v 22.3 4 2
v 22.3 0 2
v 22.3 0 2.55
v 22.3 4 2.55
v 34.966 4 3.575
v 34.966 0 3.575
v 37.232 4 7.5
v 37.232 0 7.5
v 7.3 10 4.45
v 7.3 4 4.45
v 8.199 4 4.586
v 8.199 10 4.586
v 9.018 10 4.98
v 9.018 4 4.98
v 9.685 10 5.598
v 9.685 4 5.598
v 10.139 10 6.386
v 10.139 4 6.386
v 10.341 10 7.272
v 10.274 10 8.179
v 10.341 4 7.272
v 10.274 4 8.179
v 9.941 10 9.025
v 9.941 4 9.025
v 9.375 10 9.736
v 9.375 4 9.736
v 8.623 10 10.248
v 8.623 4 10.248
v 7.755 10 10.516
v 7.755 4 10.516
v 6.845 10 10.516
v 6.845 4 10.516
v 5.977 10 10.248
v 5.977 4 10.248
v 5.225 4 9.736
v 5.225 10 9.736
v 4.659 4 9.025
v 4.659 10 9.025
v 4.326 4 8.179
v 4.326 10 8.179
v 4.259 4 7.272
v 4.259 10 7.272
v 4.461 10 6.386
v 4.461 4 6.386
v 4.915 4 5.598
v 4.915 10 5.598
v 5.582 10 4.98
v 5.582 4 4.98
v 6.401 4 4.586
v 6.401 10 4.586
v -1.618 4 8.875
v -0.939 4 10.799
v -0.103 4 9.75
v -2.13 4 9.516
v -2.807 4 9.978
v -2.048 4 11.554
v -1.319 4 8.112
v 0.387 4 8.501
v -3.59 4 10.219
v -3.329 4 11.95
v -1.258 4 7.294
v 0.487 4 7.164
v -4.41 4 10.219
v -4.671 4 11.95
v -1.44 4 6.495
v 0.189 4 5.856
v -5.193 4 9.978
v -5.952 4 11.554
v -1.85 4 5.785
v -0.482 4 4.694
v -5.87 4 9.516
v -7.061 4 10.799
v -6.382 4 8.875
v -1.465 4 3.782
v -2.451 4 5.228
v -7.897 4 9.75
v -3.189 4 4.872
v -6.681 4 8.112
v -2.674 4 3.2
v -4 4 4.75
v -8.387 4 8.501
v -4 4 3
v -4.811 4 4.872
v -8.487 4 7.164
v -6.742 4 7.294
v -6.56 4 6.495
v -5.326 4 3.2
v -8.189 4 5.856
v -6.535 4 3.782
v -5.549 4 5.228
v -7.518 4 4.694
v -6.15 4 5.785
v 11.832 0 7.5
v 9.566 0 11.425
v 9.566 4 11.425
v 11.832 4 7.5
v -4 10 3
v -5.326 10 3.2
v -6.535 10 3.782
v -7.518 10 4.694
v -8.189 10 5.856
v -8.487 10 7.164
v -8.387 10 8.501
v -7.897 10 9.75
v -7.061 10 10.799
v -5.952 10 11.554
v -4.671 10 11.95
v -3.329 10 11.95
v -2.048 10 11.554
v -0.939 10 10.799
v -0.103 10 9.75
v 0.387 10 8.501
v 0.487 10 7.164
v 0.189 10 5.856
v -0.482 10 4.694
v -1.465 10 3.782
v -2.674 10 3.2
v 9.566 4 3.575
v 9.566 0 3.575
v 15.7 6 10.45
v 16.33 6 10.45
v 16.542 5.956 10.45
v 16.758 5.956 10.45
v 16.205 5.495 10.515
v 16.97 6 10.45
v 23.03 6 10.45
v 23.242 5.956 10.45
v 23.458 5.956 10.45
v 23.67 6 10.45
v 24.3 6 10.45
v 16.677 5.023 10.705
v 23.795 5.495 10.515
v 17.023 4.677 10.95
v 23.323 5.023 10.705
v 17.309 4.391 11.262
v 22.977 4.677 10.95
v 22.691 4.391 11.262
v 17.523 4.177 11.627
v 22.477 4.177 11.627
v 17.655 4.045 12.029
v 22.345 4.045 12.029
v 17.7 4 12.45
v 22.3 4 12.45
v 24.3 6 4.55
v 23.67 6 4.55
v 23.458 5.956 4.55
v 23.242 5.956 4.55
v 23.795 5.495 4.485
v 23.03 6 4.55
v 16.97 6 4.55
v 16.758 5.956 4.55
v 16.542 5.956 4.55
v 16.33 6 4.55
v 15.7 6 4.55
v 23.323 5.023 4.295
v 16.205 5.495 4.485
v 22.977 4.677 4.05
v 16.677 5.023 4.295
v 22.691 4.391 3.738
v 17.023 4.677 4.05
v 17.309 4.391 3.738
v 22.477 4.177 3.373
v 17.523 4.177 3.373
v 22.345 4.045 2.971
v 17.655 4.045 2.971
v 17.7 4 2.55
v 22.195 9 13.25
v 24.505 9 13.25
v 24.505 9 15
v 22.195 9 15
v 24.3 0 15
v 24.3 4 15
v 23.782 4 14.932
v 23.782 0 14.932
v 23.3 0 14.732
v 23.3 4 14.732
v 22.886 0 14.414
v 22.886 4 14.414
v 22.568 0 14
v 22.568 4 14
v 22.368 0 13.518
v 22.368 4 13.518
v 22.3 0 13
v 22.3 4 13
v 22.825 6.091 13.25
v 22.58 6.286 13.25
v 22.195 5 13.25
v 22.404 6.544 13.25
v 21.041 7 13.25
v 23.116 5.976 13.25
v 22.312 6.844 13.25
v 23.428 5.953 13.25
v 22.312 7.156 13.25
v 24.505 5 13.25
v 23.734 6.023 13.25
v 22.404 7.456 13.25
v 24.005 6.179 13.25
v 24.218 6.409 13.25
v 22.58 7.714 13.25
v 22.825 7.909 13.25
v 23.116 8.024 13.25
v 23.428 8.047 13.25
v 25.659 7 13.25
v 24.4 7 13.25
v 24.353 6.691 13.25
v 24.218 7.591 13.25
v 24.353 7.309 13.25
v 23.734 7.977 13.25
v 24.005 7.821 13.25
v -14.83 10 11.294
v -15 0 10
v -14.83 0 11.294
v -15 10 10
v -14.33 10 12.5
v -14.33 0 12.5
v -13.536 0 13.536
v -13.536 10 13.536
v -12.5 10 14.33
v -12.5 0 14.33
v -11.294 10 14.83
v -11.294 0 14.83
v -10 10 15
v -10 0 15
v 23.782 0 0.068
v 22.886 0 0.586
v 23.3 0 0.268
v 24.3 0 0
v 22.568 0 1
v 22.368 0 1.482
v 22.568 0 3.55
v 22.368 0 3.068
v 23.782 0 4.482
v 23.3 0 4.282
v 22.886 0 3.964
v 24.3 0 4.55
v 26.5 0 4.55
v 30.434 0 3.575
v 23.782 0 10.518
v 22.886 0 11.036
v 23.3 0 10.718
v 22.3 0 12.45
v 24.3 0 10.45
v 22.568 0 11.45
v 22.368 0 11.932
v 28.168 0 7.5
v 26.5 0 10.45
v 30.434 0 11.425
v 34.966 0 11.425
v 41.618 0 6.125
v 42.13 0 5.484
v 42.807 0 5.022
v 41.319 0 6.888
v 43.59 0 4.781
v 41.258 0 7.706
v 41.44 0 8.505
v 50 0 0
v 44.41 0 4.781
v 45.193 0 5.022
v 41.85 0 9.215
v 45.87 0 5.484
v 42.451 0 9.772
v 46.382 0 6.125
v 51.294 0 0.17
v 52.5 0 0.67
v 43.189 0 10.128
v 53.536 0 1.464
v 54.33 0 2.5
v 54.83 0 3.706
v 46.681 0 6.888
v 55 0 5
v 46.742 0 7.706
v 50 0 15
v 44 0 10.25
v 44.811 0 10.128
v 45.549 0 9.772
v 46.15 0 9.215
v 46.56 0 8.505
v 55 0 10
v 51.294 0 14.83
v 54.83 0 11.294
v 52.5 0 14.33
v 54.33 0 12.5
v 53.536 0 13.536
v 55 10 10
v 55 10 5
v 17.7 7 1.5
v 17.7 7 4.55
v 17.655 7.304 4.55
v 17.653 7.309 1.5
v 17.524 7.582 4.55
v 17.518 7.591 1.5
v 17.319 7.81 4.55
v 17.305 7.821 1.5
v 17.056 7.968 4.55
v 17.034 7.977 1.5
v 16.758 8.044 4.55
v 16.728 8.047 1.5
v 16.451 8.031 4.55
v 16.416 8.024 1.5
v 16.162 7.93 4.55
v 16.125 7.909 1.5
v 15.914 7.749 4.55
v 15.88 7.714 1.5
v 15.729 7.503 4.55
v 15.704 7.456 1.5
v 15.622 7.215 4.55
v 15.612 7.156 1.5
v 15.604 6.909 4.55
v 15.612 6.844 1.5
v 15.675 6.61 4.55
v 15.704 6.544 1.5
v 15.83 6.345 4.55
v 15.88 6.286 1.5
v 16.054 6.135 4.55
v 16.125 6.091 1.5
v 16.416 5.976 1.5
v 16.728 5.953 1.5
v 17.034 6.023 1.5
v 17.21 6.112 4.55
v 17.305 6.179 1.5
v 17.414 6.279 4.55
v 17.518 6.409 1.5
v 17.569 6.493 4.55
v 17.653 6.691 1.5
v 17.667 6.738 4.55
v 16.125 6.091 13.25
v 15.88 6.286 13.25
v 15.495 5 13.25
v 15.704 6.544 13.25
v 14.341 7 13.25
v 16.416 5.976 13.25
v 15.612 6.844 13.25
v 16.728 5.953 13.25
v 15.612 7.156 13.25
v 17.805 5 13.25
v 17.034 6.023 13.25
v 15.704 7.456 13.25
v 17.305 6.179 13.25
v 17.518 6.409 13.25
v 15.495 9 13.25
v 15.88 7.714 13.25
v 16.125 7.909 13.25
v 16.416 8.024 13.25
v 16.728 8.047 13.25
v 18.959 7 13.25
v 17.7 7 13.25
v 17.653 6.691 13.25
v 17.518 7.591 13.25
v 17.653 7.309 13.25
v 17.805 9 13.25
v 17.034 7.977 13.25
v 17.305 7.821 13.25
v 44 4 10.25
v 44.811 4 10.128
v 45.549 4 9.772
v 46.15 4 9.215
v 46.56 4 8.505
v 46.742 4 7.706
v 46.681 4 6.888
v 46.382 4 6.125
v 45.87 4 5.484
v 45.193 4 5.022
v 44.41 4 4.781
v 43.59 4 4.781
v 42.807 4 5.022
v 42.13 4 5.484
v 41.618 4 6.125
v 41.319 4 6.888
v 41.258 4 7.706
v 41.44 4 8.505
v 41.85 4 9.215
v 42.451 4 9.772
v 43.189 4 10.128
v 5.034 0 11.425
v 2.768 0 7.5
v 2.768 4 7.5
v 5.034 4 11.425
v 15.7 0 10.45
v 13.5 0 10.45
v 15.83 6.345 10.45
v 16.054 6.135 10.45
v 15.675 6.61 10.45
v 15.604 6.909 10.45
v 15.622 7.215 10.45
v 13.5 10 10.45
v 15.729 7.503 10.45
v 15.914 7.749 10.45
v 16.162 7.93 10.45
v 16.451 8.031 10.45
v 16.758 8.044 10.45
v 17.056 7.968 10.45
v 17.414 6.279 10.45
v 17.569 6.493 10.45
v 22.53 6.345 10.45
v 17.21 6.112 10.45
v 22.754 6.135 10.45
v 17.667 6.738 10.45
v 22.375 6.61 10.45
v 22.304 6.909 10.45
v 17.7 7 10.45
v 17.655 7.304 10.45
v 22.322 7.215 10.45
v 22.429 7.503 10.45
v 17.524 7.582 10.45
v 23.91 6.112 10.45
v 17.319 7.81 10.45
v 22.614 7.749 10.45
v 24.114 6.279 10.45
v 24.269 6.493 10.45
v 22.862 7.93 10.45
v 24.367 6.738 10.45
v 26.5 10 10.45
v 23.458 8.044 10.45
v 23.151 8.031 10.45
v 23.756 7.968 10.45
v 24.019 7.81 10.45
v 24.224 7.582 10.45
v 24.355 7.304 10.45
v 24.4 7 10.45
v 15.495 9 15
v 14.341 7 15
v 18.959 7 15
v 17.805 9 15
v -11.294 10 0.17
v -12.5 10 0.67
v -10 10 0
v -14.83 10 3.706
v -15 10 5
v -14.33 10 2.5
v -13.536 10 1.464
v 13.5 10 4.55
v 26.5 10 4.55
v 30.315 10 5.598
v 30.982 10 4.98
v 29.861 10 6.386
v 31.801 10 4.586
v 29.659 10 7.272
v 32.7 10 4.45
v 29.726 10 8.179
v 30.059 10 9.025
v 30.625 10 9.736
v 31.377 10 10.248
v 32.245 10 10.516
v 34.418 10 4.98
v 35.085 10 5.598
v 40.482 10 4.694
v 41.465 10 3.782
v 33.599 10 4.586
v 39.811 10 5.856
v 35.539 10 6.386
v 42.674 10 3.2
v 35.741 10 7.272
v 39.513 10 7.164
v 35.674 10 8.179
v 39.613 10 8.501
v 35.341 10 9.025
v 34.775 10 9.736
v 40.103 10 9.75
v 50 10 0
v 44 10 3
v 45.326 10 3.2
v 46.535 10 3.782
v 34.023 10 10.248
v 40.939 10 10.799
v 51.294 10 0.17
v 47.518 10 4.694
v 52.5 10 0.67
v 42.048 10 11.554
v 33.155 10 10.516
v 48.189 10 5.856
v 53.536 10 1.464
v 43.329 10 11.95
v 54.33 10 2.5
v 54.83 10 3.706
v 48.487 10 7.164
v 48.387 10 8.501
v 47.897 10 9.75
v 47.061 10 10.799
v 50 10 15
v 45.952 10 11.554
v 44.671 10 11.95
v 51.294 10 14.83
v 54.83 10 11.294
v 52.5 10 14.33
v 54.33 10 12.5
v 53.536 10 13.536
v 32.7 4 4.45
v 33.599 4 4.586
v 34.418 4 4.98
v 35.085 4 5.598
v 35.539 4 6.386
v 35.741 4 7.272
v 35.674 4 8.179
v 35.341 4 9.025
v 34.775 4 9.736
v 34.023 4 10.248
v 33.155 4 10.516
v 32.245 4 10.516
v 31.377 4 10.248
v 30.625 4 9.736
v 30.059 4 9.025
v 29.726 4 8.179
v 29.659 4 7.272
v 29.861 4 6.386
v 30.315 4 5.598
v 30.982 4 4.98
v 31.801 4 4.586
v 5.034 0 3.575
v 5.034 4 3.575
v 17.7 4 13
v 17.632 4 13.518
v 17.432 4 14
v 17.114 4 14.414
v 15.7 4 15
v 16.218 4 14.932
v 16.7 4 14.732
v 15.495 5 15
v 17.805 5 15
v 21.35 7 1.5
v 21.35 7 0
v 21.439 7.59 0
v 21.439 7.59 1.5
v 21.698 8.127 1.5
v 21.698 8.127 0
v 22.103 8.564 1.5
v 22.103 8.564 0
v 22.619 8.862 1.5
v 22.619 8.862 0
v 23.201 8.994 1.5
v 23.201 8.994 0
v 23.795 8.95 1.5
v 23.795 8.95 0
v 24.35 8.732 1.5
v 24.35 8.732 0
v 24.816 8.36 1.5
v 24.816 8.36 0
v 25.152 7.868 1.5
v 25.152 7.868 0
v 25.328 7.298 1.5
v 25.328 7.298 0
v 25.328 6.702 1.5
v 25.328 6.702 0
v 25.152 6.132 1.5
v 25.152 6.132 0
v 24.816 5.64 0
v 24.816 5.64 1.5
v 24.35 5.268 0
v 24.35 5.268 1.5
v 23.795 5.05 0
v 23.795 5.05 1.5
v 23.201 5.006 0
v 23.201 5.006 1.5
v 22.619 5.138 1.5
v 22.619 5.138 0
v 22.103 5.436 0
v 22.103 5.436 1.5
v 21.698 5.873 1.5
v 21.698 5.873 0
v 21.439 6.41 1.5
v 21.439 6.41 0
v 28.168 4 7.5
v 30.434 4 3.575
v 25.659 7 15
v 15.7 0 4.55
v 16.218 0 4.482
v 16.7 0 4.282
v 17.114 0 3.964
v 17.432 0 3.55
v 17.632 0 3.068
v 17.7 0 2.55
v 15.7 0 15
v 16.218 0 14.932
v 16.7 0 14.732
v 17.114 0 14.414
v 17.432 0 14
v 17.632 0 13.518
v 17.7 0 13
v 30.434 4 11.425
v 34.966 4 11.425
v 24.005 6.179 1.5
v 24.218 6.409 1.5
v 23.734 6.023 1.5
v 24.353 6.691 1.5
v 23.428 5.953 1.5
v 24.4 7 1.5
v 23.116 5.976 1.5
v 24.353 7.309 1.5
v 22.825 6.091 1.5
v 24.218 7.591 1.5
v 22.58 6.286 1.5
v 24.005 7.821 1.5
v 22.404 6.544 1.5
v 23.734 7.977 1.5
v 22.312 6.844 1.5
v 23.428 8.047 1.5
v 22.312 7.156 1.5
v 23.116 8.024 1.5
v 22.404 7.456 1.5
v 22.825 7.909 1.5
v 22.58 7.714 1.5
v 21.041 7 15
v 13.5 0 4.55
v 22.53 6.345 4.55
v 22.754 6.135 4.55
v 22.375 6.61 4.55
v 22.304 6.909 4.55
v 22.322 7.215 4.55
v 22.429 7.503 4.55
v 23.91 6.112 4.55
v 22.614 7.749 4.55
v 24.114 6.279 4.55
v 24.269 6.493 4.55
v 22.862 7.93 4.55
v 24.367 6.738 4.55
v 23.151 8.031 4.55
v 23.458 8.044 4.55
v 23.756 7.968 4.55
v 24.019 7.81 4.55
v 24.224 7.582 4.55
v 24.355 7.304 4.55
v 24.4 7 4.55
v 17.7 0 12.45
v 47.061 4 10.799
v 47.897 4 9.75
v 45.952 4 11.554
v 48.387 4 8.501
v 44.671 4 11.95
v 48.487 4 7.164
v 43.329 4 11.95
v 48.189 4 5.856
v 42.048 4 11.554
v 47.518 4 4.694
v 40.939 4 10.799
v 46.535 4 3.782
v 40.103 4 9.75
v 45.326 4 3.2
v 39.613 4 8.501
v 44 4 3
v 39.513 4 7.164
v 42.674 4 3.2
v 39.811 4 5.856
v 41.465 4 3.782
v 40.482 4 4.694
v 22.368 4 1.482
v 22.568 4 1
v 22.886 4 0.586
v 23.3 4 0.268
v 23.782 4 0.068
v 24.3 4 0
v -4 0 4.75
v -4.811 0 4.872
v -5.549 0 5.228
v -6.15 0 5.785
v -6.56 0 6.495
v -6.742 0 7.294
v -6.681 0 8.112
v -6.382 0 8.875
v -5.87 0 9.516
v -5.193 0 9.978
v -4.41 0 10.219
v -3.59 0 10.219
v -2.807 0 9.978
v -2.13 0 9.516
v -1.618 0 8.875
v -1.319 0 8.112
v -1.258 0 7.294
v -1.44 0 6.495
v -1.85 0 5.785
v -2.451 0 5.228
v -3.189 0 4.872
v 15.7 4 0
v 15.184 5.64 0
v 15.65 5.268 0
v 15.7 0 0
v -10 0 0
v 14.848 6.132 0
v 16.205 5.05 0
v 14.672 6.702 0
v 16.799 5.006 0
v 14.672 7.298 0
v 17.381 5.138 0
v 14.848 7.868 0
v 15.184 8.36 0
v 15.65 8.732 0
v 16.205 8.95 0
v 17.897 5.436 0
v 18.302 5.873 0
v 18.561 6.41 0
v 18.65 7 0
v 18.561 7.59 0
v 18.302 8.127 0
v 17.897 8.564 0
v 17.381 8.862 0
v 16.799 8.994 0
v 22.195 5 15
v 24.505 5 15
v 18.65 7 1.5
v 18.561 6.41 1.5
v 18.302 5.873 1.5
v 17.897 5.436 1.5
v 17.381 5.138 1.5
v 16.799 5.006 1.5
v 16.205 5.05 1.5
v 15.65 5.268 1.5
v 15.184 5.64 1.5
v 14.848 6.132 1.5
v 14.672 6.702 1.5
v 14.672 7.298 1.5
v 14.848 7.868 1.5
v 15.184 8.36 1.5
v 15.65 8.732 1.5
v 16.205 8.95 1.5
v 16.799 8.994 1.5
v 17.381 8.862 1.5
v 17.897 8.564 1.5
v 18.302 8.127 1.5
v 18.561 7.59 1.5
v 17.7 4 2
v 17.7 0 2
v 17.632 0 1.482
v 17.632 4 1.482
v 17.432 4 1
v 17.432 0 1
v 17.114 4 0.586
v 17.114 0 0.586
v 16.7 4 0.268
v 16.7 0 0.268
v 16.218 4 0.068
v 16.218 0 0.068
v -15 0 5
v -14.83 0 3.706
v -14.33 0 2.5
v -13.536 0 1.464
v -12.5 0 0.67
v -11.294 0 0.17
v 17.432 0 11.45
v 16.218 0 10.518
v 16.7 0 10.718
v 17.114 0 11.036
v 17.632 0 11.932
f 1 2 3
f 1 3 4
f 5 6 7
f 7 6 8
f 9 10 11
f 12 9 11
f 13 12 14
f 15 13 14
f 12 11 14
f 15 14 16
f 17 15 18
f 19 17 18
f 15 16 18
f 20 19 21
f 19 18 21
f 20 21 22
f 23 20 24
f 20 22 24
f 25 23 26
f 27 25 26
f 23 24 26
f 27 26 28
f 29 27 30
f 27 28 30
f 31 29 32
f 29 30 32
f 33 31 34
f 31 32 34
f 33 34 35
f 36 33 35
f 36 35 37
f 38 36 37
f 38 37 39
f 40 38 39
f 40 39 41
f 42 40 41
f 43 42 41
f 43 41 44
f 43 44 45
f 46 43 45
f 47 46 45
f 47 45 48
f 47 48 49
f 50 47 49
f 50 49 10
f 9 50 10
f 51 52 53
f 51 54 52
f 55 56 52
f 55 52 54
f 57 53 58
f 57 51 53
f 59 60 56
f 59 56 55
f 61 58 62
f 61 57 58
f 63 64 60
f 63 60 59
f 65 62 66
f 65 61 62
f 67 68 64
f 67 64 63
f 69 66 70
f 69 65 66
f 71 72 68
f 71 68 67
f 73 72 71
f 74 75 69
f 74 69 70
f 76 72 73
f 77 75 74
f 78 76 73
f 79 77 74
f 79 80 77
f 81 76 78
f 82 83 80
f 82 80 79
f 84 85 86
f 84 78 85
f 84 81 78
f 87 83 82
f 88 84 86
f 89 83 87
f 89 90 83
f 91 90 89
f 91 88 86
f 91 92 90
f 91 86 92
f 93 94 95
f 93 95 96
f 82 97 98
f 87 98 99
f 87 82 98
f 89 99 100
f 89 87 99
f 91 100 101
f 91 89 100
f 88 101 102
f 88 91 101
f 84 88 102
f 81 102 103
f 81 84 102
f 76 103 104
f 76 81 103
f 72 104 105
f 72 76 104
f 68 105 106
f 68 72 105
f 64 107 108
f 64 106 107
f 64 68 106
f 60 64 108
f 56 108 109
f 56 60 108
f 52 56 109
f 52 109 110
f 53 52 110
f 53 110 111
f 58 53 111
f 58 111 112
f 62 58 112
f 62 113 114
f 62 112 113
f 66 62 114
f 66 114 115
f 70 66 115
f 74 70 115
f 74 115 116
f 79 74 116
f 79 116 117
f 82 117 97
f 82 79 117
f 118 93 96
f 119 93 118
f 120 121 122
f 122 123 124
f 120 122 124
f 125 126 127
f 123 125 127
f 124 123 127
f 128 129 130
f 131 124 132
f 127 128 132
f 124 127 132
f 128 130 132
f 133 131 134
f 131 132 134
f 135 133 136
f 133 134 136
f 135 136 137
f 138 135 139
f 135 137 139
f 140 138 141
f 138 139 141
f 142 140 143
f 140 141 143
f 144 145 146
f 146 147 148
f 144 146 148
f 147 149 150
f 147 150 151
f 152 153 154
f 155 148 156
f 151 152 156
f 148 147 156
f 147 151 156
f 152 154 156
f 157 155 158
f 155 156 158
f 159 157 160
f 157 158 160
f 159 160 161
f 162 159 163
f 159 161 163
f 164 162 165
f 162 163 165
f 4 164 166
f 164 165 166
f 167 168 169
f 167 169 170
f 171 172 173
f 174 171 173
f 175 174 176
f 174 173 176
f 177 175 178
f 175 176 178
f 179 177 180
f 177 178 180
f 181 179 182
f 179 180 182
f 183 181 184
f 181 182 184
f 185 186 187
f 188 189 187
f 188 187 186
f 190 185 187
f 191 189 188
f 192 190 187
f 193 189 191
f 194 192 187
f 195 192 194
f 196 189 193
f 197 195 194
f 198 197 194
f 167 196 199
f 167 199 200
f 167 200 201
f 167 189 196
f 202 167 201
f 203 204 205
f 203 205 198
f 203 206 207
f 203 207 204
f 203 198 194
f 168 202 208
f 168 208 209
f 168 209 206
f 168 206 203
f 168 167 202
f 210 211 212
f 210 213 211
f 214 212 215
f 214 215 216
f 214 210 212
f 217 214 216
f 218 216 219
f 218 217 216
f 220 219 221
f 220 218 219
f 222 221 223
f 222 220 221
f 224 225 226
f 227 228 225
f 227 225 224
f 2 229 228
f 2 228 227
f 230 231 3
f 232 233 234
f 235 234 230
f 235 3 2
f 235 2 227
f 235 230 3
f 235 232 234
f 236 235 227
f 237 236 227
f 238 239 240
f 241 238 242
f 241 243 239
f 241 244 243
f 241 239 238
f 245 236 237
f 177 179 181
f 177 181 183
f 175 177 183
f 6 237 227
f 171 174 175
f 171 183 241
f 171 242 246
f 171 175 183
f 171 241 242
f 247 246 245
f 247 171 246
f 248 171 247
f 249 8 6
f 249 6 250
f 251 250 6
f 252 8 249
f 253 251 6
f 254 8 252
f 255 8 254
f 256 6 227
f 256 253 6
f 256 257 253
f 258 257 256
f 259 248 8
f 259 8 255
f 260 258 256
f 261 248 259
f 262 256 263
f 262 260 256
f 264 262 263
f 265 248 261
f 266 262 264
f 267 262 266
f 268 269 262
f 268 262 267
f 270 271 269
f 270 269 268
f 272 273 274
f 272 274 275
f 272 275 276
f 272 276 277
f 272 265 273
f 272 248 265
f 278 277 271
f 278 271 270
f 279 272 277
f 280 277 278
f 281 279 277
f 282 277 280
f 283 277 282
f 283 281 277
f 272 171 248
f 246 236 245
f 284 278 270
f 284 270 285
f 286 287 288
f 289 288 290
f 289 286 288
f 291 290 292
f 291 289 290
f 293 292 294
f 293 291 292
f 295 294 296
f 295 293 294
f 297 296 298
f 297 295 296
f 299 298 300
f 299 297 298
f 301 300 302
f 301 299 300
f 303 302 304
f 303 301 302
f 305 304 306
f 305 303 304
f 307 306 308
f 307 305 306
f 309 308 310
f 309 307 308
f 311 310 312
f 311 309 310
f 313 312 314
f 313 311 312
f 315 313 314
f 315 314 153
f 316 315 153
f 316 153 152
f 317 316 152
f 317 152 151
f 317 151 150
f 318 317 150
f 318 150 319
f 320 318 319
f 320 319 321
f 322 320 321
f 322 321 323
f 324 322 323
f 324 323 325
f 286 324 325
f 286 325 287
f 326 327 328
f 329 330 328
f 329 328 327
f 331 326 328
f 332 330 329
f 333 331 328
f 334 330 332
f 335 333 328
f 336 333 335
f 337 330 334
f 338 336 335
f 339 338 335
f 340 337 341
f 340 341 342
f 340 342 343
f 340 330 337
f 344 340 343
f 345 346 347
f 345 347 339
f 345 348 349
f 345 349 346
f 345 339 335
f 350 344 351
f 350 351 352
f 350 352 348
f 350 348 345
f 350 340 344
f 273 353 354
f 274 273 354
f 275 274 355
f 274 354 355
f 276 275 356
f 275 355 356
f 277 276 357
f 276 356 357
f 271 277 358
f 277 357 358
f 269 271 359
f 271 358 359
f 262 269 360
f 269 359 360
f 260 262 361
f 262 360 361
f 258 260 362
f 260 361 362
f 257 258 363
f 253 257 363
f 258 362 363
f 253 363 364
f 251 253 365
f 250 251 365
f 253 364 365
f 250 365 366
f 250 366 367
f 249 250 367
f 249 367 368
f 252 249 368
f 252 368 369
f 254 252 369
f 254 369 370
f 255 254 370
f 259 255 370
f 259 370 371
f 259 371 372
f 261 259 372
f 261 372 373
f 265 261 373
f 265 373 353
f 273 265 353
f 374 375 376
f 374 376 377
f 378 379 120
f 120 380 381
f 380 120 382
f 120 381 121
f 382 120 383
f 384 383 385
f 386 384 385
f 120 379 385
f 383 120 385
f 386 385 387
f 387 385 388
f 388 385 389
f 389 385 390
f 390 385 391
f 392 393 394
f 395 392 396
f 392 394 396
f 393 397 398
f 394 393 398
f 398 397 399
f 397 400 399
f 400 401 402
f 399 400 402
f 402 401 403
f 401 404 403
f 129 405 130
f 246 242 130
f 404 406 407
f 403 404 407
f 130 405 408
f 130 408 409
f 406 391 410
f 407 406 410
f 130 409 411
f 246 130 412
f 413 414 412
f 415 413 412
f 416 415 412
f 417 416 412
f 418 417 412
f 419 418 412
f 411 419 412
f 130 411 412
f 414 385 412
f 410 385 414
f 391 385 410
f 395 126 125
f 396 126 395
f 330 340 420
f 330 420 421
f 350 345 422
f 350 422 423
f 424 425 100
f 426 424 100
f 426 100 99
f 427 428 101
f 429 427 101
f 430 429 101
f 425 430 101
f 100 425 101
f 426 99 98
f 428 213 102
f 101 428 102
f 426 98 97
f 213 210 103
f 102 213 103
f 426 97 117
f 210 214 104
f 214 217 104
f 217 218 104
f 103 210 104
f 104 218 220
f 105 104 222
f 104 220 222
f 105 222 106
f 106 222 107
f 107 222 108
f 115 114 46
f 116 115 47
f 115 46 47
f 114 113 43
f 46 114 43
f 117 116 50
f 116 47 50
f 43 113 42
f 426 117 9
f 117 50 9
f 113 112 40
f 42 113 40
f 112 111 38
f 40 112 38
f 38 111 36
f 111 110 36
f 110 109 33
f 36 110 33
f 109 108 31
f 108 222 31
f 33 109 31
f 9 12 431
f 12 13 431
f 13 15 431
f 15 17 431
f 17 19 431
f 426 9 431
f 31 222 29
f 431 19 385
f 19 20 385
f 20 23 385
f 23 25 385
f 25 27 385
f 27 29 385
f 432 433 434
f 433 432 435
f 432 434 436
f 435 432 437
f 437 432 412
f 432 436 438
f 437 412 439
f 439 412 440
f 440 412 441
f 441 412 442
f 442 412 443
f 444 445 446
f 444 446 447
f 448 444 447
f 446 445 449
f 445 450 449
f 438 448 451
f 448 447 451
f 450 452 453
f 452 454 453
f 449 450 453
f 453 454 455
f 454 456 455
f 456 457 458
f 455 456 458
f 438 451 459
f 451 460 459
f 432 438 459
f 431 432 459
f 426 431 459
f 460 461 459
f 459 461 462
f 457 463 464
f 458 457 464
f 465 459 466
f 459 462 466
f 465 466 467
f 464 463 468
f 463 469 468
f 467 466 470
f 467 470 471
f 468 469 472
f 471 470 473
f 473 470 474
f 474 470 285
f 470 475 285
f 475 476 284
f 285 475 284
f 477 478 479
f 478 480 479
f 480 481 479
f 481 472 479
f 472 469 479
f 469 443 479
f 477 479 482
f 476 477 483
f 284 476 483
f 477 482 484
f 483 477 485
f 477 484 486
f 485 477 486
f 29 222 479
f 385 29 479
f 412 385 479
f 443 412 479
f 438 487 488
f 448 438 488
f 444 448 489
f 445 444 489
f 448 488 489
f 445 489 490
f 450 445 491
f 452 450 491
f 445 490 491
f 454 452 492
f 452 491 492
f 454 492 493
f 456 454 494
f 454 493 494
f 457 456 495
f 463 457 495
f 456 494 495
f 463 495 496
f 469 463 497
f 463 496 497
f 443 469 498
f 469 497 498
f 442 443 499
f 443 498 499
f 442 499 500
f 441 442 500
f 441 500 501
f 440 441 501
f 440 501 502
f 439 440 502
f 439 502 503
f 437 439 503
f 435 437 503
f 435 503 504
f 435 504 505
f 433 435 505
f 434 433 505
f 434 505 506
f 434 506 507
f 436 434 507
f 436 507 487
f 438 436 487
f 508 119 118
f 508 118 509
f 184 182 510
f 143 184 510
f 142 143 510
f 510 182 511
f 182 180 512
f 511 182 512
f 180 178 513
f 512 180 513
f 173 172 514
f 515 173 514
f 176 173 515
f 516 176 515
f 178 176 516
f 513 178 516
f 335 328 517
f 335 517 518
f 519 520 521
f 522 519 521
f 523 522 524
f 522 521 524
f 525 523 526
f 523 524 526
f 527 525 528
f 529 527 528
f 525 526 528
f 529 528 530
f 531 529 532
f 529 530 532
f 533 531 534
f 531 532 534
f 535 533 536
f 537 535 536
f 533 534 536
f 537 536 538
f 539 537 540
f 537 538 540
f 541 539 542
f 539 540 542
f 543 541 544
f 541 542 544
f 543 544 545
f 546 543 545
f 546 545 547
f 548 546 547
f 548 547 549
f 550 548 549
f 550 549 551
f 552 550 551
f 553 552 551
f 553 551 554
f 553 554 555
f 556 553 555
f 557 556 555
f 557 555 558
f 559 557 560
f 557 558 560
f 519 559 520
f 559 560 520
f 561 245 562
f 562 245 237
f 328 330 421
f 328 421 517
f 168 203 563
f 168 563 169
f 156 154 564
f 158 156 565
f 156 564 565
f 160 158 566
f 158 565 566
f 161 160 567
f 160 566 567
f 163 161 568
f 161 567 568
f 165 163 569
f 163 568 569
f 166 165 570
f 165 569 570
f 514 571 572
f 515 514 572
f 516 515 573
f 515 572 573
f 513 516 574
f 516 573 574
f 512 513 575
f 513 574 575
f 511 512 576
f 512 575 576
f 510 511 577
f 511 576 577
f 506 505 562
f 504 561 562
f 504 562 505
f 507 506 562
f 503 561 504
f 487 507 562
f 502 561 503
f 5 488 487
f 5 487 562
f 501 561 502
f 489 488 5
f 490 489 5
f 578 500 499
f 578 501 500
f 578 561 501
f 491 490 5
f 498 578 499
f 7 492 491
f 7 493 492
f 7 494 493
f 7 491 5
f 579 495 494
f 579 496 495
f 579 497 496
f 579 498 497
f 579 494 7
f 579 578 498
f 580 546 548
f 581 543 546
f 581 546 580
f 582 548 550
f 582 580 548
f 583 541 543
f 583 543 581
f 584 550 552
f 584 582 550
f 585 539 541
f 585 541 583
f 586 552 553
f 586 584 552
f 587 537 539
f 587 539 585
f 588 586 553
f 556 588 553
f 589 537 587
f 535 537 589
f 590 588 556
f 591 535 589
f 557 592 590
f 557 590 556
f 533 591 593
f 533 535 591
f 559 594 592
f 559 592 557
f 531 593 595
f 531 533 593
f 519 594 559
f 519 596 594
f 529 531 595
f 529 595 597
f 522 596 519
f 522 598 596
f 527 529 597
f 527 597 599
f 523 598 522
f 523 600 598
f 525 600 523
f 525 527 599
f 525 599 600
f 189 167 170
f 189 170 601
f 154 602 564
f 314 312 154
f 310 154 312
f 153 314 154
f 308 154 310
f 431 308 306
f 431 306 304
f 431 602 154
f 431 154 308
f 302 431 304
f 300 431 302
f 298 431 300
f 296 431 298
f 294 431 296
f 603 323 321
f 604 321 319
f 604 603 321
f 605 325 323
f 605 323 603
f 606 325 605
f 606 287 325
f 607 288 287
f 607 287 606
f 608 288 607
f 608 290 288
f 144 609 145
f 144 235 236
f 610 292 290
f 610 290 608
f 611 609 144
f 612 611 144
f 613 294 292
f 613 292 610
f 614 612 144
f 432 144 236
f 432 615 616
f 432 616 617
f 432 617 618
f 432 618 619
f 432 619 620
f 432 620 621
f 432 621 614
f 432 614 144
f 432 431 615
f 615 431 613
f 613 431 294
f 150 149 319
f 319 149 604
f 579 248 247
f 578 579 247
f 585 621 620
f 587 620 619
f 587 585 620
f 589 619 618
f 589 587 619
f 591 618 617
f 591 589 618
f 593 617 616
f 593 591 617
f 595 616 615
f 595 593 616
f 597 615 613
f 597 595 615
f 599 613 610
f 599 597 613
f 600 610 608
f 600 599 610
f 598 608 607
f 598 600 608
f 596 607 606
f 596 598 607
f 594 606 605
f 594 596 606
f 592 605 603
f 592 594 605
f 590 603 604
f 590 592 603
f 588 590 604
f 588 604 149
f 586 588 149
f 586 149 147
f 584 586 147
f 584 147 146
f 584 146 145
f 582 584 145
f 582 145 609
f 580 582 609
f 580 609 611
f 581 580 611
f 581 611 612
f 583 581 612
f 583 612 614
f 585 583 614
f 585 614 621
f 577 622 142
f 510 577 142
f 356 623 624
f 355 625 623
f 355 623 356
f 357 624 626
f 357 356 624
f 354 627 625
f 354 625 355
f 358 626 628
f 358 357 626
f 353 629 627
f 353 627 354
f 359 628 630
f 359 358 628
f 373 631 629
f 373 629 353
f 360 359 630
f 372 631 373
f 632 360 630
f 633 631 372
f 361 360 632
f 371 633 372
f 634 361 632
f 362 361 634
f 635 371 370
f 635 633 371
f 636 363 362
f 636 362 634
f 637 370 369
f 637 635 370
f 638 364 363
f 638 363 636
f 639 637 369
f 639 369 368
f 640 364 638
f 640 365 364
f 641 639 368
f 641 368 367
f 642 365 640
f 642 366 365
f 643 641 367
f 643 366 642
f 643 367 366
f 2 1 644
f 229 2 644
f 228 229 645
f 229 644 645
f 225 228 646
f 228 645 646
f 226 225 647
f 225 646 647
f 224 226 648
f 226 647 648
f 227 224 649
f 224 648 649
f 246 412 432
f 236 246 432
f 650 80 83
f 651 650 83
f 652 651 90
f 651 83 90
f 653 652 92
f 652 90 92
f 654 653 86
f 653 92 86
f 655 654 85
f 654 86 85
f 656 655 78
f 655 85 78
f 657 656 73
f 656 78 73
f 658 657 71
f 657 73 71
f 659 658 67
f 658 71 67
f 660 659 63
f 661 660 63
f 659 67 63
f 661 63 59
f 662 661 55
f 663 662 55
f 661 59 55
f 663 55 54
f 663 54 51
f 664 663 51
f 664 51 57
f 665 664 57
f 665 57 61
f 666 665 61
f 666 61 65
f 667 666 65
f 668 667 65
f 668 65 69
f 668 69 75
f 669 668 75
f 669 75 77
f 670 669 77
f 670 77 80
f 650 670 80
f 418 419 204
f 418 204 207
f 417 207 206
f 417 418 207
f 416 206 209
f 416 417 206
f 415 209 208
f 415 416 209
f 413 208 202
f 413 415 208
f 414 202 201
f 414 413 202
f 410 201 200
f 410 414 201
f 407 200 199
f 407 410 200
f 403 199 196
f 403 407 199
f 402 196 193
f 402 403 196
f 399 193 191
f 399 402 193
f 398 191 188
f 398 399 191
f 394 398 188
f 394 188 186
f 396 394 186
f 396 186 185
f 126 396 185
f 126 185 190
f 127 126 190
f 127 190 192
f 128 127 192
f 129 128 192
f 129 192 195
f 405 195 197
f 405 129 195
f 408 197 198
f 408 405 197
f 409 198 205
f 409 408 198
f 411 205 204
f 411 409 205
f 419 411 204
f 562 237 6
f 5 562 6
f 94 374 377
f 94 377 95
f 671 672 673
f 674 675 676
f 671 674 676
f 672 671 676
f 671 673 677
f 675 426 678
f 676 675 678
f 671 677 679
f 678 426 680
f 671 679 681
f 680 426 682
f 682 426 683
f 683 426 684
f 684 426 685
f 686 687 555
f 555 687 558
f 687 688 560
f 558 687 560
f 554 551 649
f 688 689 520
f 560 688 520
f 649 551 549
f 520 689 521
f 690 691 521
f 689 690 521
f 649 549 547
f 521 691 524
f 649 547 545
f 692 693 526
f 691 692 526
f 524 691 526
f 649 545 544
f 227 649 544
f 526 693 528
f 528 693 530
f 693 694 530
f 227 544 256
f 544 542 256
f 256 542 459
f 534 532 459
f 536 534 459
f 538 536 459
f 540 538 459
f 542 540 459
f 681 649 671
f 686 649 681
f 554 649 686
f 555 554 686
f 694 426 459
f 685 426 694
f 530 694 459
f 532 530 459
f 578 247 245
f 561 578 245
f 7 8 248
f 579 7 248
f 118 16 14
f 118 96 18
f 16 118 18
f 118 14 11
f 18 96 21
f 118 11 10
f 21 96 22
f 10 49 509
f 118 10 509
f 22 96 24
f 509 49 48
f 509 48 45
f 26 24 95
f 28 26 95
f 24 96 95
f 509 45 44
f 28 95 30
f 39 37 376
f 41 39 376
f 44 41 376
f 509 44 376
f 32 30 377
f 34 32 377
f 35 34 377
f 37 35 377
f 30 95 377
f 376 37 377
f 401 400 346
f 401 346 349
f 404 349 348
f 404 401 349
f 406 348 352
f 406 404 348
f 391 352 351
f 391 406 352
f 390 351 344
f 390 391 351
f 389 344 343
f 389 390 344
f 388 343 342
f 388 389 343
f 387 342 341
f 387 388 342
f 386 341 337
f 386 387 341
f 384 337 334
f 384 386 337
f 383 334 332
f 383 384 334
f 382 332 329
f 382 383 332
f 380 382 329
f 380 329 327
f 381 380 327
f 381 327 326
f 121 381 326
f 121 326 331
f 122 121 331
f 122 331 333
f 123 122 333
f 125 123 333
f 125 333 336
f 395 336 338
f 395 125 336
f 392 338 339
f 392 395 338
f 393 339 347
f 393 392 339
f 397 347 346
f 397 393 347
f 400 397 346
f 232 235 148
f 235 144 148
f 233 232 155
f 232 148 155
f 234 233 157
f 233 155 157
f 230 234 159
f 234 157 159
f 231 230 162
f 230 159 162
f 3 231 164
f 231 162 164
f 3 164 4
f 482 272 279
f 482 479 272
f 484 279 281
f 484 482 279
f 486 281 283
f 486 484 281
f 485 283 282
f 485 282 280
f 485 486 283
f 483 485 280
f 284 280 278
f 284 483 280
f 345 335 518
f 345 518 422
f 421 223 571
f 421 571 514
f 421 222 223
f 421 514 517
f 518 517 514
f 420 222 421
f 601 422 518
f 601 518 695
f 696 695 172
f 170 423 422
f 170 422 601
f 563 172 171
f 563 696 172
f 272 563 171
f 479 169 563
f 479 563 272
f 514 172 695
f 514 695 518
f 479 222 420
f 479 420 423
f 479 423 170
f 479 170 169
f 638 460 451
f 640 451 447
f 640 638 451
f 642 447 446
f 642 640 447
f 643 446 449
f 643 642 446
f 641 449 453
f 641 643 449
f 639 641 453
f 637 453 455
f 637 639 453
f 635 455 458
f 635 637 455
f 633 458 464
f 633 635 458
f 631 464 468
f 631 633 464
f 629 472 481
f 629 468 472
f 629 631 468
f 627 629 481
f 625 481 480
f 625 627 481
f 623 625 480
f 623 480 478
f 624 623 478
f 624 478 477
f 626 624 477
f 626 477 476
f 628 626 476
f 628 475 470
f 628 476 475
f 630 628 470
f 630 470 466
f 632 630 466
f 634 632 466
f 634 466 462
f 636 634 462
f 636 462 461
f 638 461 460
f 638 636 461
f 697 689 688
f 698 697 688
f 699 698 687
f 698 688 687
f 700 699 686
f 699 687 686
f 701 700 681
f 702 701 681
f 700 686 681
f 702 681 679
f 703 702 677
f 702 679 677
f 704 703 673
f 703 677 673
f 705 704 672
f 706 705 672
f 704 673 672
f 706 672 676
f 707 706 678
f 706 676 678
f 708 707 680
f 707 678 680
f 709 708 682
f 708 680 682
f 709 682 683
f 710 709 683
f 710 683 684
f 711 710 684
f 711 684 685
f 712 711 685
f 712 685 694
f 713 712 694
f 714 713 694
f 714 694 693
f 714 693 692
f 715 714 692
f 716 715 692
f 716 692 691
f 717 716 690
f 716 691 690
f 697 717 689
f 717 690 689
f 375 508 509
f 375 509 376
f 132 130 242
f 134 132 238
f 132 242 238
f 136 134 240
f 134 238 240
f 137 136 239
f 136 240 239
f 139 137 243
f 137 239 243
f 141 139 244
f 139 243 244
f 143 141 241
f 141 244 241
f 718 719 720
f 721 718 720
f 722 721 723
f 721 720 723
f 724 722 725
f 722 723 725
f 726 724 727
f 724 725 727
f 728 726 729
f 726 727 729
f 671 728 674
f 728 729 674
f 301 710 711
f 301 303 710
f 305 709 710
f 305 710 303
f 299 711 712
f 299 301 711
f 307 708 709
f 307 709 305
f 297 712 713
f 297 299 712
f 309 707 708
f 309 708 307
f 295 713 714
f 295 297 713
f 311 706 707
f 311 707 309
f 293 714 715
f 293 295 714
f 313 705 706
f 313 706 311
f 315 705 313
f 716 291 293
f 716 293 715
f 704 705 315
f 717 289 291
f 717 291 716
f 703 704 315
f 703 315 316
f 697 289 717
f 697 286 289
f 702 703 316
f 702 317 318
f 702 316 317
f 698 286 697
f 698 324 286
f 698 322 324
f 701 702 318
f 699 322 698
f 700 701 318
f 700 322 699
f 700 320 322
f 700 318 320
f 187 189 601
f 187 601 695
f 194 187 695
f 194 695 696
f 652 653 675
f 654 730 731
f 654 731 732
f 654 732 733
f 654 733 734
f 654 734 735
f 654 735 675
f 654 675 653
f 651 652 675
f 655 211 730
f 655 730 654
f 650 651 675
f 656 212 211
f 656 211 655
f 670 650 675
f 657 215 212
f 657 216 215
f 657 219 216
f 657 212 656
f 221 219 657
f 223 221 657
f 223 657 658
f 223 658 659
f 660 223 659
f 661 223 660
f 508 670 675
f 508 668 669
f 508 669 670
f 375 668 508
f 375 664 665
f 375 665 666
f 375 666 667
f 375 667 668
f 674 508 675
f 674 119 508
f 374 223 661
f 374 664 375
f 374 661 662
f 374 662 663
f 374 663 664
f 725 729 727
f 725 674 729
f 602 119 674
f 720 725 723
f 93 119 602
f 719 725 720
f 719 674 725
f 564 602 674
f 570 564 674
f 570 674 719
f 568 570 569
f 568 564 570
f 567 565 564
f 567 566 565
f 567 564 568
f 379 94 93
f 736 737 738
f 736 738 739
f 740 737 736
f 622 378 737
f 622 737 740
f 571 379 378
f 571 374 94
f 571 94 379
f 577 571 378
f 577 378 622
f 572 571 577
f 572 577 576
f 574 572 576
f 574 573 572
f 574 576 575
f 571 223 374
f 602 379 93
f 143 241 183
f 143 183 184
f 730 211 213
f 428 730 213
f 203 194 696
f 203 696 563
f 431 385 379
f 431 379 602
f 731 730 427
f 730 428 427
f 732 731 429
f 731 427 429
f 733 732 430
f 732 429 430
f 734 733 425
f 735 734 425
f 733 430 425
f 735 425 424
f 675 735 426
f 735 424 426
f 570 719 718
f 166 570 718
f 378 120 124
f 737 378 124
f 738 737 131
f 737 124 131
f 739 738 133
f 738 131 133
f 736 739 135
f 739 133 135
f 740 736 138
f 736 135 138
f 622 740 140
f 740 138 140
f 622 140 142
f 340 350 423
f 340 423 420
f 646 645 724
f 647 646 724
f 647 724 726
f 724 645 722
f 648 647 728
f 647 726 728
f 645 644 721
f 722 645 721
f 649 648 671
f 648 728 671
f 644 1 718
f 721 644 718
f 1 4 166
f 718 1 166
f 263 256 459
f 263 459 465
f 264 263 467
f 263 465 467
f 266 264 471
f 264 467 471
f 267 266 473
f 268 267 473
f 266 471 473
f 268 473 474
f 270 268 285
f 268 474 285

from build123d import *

# Parameters (mm, degrees)
SKETCH1_W                = 40
SKETCH1_H                = 10
SWITCHCASE_DEPTH         = 15
SKETCH2_W                = 13
SKETCH2_H                = 5.9
SWITCHCAVITY_DEPTH       = 44.874821937
SWITCHM2HOLES_DEPTH      = 43.534721111
SWITCHM2HOLES_DEPTH_BACK = 43.534721111
SKETCH3_R                = 1.05
SKETCH14_R               = 2
M2HEAD_DEPTH             = 1.5
M2NUTINSERTS_DEPTH       = 44.874821937
M2NUTINSERTS_DEPTH_BACK  = 1.75
SKETCH7_W                = 15
SKETCH7_H                = 10
WINGS_DEPTH              = 15
M5NUTS_DEPTH             = 4
SKETCH10_R               = 3.05
M6HOLE_DEPTH             = 58.879184514
WIRECHANNEL_DEPTH        = 57.870049235
WIRECHANNEL_DEPTH_BACK   = 57.870049235
SKETCH11_W               = 4.6
SKETCH11_H               = 4
CHANNELFILLET_R          = 2
M5HEAD_DEPTH             = 58.879184514
M5HEAD_DEPTH_BACK        = 6
SKETCH12_R               = 4.5
SKETCH13_R               = 2.75
M5THREAD_DEPTH           = 58.879184514
ENDFILLET_R              = 5


with BuildPart() as part:
    # Sketch1 → SwitchCase (new body)
    with BuildSketch(Plane.XY):
        with Locations((20, 5)):
            Rectangle(SKETCH1_W, SKETCH1_H)
    extrude(amount=SWITCHCASE_DEPTH)

    # Sketch2 → SwitchCavity (cut, through all)
    with BuildSketch(Plane(origin=(0, 10, 0), x_dir=(1, 0, 0), z_dir=(0, 1, 0))):
        with Locations((20, -7.5)):
            Rectangle(SKETCH2_W, SKETCH2_H)
    extrude(amount=-SWITCHCAVITY_DEPTH, mode=Mode.SUBTRACT)

    # Sketch3 → SwitchM2Holes (cut, two sides: drawn at the far end of the back side and taken through both)
    with BuildSketch(Plane.XY.offset(4.55).offset(-SWITCHM2HOLES_DEPTH_BACK)):
        with Locations((16.65, 7)):
            Circle(SKETCH3_R)
        with Locations((23.35, 7)):
            Circle(SKETCH3_R)
    extrude(amount=SWITCHM2HOLES_DEPTH + SWITCHM2HOLES_DEPTH_BACK, mode=Mode.SUBTRACT)

    # Sketch14 → M2Head (cut)
    with BuildSketch(Plane(origin=(0, 0, 0), x_dir=(-1, 0, 0), z_dir=(0, 0, -1))):
        with Locations((-23.35, 7)):
            Circle(SKETCH14_R)
        with Locations(Location((-16.65, 7, 0), (0, 0, 180))):
            Circle(SKETCH14_R)
    extrude(amount=-M2HEAD_DEPTH, mode=Mode.SUBTRACT)

    # Sketch5 → M2NutInserts (cut, two sides: drawn at the far end of the back side and taken through both)
    with BuildSketch(Plane.XY.offset(15).offset(-M2NUTINSERTS_DEPTH_BACK)):
        Polygon((18.959401077, 7), (17.804700538, 9), (15.495299462, 9), (14.340598923, 7), (15.495299462, 5), (17.804700538, 5), align=None)
        Polygon((25.659401077, 7), (24.504700538, 9), (22.195299462, 9), (21.040598923, 7), (22.195299462, 5), (24.504700538, 5), align=None)
    extrude(amount=M2NUTINSERTS_DEPTH + M2NUTINSERTS_DEPTH_BACK, mode=Mode.SUBTRACT)

    # Sketch7 → Wings (add)
    with BuildSketch(Plane.XY.offset(15)):
        with Locations((-7.5, 5)):
            Rectangle(SKETCH7_W, SKETCH7_H)
        with Locations((47.5, 5)):
            Rectangle(SKETCH7_W, SKETCH7_H)
    extrude(amount=-WINGS_DEPTH)

    # Sketch9 → M5Nuts (cut)
    with BuildSketch(Plane.XZ):
        Polygon((37.232199613, 7.5), (34.966099807, 11.425), (30.433900193, 11.425), (28.167800387, 7.5), (30.433900193, 3.575), (34.966099807, 3.575), align=None)
        Polygon((5.033900193, 3.575), (2.767800387, 7.5), (5.033900193, 11.425), (9.566099807, 11.425), (11.832199613, 7.5), (9.566099807, 3.575), align=None)
    extrude(amount=-M5NUTS_DEPTH, mode=Mode.SUBTRACT)

    # Sketch10 → M6Hole (cut, through all)
    with BuildSketch(Plane.XZ):
        with Locations(Location((7.3, 7.5, 0), (0, 0, 270))):
            Circle(SKETCH10_R)
        with Locations(Location((32.7, 7.5, 0), (0, 0, 270))):
            Circle(SKETCH10_R)
    extrude(amount=-M6HOLE_DEPTH, mode=Mode.SUBTRACT)

    # Sketch11 → WireChannel (cut, two sides: drawn at the far end of the back side and taken through both)
    with BuildSketch(Plane.XY.offset(4.55).offset(-WIRECHANNEL_DEPTH_BACK)):
        with Locations((20, 2)):
            Rectangle(SKETCH11_W, SKETCH11_H)
    extrude(amount=WIRECHANNEL_DEPTH + WIRECHANNEL_DEPTH_BACK, mode=Mode.SUBTRACT)

    # ChannelFillet
    # the kernel refuses this fillet: 2 mm, written as the material it takes off along each edge
    with BuildSketch(Plane(origin=(22.3, 4, 10.45), x_dir=(0, 1, 0), z_dir=(-1, 0, 0)), Plane(origin=(17.7, 4, 4.55), x_dir=(0, 1, 0), z_dir=(1, 0, 0))) as channelfillet_piece_1:
        with BuildLine():
            CenterArc((CHANNELFILLET_R, -CHANNELFILLET_R), CHANNELFILLET_R, 90, 90)
            Line((0, -CHANNELFILLET_R), (-CHANNELFILLET_R * 0.02, -CHANNELFILLET_R))
            Line((-CHANNELFILLET_R * 0.02, -CHANNELFILLET_R), (-CHANNELFILLET_R * 0.02, CHANNELFILLET_R * 0.02))
            Line((-CHANNELFILLET_R * 0.02, CHANNELFILLET_R * 0.02), (CHANNELFILLET_R, CHANNELFILLET_R * 0.02))
            Line((CHANNELFILLET_R, CHANNELFILLET_R * 0.02), (CHANNELFILLET_R, 0))
        make_face()
    extrude(amount=4.6, mode=Mode.SUBTRACT)
    with BuildSketch(Plane(origin=(17.7, 4, 10.45), x_dir=(-1, 0, 0), z_dir=(0, -1, 0)), Plane(origin=(22.3, 0, 10.45), x_dir=(1, 0, 0), z_dir=(0, 1, 0)), Plane(origin=(22.3, 4, 4.55), x_dir=(1, 0, 0), z_dir=(0, -1, 0)), Plane(origin=(22.3, 4, 15), x_dir=(1, 0, 0), z_dir=(0, -1, 0))) as channelfillet_piece_2:
        with BuildLine():
            CenterArc((CHANNELFILLET_R, -CHANNELFILLET_R), CHANNELFILLET_R, 90, 90)
            Line((0, -CHANNELFILLET_R), (-CHANNELFILLET_R * 0.02, -CHANNELFILLET_R))
            Line((-CHANNELFILLET_R * 0.02, -CHANNELFILLET_R), (-CHANNELFILLET_R * 0.02, CHANNELFILLET_R * 0.02))
            Line((-CHANNELFILLET_R * 0.02, CHANNELFILLET_R * 0.02), (CHANNELFILLET_R, CHANNELFILLET_R * 0.02))
            Line((CHANNELFILLET_R, CHANNELFILLET_R * 0.02), (CHANNELFILLET_R, 0))
        make_face()
    extrude(amount=4, mode=Mode.SUBTRACT)
    with BuildSketch(Plane(origin=(22.3, 4, 0), x_dir=(1, 0, 0), z_dir=(0, -1, 0)), Plane(origin=(17.7, 0, 4.55), x_dir=(0, 0, -1), z_dir=(0, 1, 0)), Plane(origin=(17.7, 0, 0), x_dir=(-1, 0, 0), z_dir=(0, 1, 0)), Plane(origin=(17.7, 0, 15), x_dir=(0, 0, -1), z_dir=(0, 1, 0))) as channelfillet_piece_3:
        with BuildLine():
            CenterArc((CHANNELFILLET_R, CHANNELFILLET_R), CHANNELFILLET_R, 180, 90)
            Line((0, CHANNELFILLET_R), (-CHANNELFILLET_R * 0.02, CHANNELFILLET_R))
            Line((-CHANNELFILLET_R * 0.02, CHANNELFILLET_R), (-CHANNELFILLET_R * 0.02, -CHANNELFILLET_R * 0.02))
            Line((-CHANNELFILLET_R * 0.02, -CHANNELFILLET_R * 0.02), (CHANNELFILLET_R, -CHANNELFILLET_R * 0.02))
            Line((CHANNELFILLET_R, -CHANNELFILLET_R * 0.02), (CHANNELFILLET_R, 0))
        make_face()
    extrude(amount=4, mode=Mode.SUBTRACT)
    with BuildSketch(Plane(origin=(27.3, 4, 10.45), x_dir=(0, 1, 0), z_dir=(-1, 0, 0))) as channelfillet_piece_4a_section:
        with BuildLine():
            CenterArc((CHANNELFILLET_R, -CHANNELFILLET_R), CHANNELFILLET_R, 90, 90)
            Line((0, -CHANNELFILLET_R), (-CHANNELFILLET_R * 0.02, -CHANNELFILLET_R))
            Line((-CHANNELFILLET_R * 0.02, -CHANNELFILLET_R), (-CHANNELFILLET_R * 0.02, CHANNELFILLET_R * 0.02))
            Line((-CHANNELFILLET_R * 0.02, CHANNELFILLET_R * 0.02), (CHANNELFILLET_R, CHANNELFILLET_R * 0.02))
            Line((CHANNELFILLET_R, CHANNELFILLET_R * 0.02), (CHANNELFILLET_R, 0))
        make_face()
    channelfillet_piece_4a = extrude(amount=9.6, mode=Mode.PRIVATE)
    channelfillet_piece_4a = split(channelfillet_piece_4a, bisect_by=Plane(origin=(22.3, 4.452790229, 10.902790229), z_dir=(1, 0, 0)), keep=Keep.TOP, mode=Mode.PRIVATE)
    with BuildSketch(Plane(origin=(22.3, 0, 10.45), x_dir=(1, 0, 0), z_dir=(0, 1, 0))) as channelfillet_piece_4b_section:
        with BuildLine():
            CenterArc((CHANNELFILLET_R, -CHANNELFILLET_R), CHANNELFILLET_R, 90, 90)
            Line((0, -CHANNELFILLET_R), (-CHANNELFILLET_R * 0.02, -CHANNELFILLET_R))
            Line((-CHANNELFILLET_R * 0.02, -CHANNELFILLET_R), (-CHANNELFILLET_R * 0.02, CHANNELFILLET_R * 0.02))
            Line((-CHANNELFILLET_R * 0.02, CHANNELFILLET_R * 0.02), (CHANNELFILLET_R, CHANNELFILLET_R * 0.02))
            Line((CHANNELFILLET_R, CHANNELFILLET_R * 0.02), (CHANNELFILLET_R, 0))
        make_face()
    channelfillet_piece_4b = extrude(amount=9, mode=Mode.PRIVATE)
    channelfillet_piece_4b = split(channelfillet_piece_4b, bisect_by=Plane(origin=(22.752790229, 4, 10.902790229), z_dir=(0, 1, 0)), keep=Keep.TOP, mode=Mode.PRIVATE)
    channelfillet_piece_4 = channelfillet_piece_4a & channelfillet_piece_4b
    add(channelfillet_piece_4, mode=Mode.SUBTRACT)
    with BuildSketch(Plane(origin=(17.7, 9, 10.45), x_dir=(-1, 0, 0), z_dir=(0, -1, 0))) as channelfillet_piece_5a_section:
        with BuildLine():
            CenterArc((CHANNELFILLET_R, -CHANNELFILLET_R), CHANNELFILLET_R, 90, 90)
            Line((0, -CHANNELFILLET_R), (-CHANNELFILLET_R * 0.02, -CHANNELFILLET_R))
            Line((-CHANNELFILLET_R * 0.02, -CHANNELFILLET_R), (-CHANNELFILLET_R * 0.02, CHANNELFILLET_R * 0.02))
            Line((-CHANNELFILLET_R * 0.02, CHANNELFILLET_R * 0.02), (CHANNELFILLET_R, CHANNELFILLET_R * 0.02))
            Line((CHANNELFILLET_R, CHANNELFILLET_R * 0.02), (CHANNELFILLET_R, 0))
        make_face()
    channelfillet_piece_5a = extrude(amount=9, mode=Mode.PRIVATE)
    channelfillet_piece_5a = split(channelfillet_piece_5a, bisect_by=Plane(origin=(17.247209771, 4, 10.902790229), z_dir=(0, 1, 0)), keep=Keep.TOP, mode=Mode.PRIVATE)
    with BuildSketch(Plane(origin=(22.3, 4, 10.45), x_dir=(0, 1, 0), z_dir=(-1, 0, 0))) as channelfillet_piece_5b_section:
        with BuildLine():
            CenterArc((CHANNELFILLET_R, -CHANNELFILLET_R), CHANNELFILLET_R, 90, 90)
            Line((0, -CHANNELFILLET_R), (-CHANNELFILLET_R * 0.02, -CHANNELFILLET_R))
            Line((-CHANNELFILLET_R * 0.02, -CHANNELFILLET_R), (-CHANNELFILLET_R * 0.02, CHANNELFILLET_R * 0.02))
            Line((-CHANNELFILLET_R * 0.02, CHANNELFILLET_R * 0.02), (CHANNELFILLET_R, CHANNELFILLET_R * 0.02))
            Line((CHANNELFILLET_R, CHANNELFILLET_R * 0.02), (CHANNELFILLET_R, 0))
        make_face()
    channelfillet_piece_5b = extrude(amount=9.6, mode=Mode.PRIVATE)
    channelfillet_piece_5b = split(channelfillet_piece_5b, bisect_by=Plane(origin=(17.7, 4.452790229, 10.902790229), z_dir=(-1, 0, 0)), keep=Keep.TOP, mode=Mode.PRIVATE)
    channelfillet_piece_5 = channelfillet_piece_5a & channelfillet_piece_5b
    add(channelfillet_piece_5, mode=Mode.SUBTRACT)
    with BuildSketch(Plane(origin=(22.3, 9, 4.55), x_dir=(1, 0, 0), z_dir=(0, -1, 0))) as channelfillet_piece_6a_section:
        with BuildLine():
            CenterArc((CHANNELFILLET_R, -CHANNELFILLET_R), CHANNELFILLET_R, 90, 90)
            Line((0, -CHANNELFILLET_R), (-CHANNELFILLET_R * 0.02, -CHANNELFILLET_R))
            Line((-CHANNELFILLET_R * 0.02, -CHANNELFILLET_R), (-CHANNELFILLET_R * 0.02, CHANNELFILLET_R * 0.02))
            Line((-CHANNELFILLET_R * 0.02, CHANNELFILLET_R * 0.02), (CHANNELFILLET_R, CHANNELFILLET_R * 0.02))
            Line((CHANNELFILLET_R, CHANNELFILLET_R * 0.02), (CHANNELFILLET_R, 0))
        make_face()
    channelfillet_piece_6a = extrude(amount=9, mode=Mode.PRIVATE)
    channelfillet_piece_6a = split(channelfillet_piece_6a, bisect_by=Plane(origin=(22.752790229, 4, 4.097209771), z_dir=(0, 1, 0)), keep=Keep.TOP, mode=Mode.PRIVATE)
    with BuildSketch(Plane(origin=(17.7, 4, 4.55), x_dir=(0, 1, 0), z_dir=(1, 0, 0))) as channelfillet_piece_6b_section:
        with BuildLine():
            CenterArc((CHANNELFILLET_R, -CHANNELFILLET_R), CHANNELFILLET_R, 90, 90)
            Line((0, -CHANNELFILLET_R), (-CHANNELFILLET_R * 0.02, -CHANNELFILLET_R))
            Line((-CHANNELFILLET_R * 0.02, -CHANNELFILLET_R), (-CHANNELFILLET_R * 0.02, CHANNELFILLET_R * 0.02))
            Line((-CHANNELFILLET_R * 0.02, CHANNELFILLET_R * 0.02), (CHANNELFILLET_R, CHANNELFILLET_R * 0.02))
            Line((CHANNELFILLET_R, CHANNELFILLET_R * 0.02), (CHANNELFILLET_R, 0))
        make_face()
    channelfillet_piece_6b = extrude(amount=9.6, mode=Mode.PRIVATE)
    channelfillet_piece_6b = split(channelfillet_piece_6b, bisect_by=Plane(origin=(22.3, 4.452790229, 4.097209771), z_dir=(1, 0, 0)), keep=Keep.TOP, mode=Mode.PRIVATE)
    channelfillet_piece_6 = channelfillet_piece_6a & channelfillet_piece_6b
    add(channelfillet_piece_6, mode=Mode.SUBTRACT)
    with BuildSketch(Plane(origin=(17.7, 0, 4.55), x_dir=(0, 0, -1), z_dir=(0, 1, 0))) as channelfillet_piece_7a_section:
        with BuildLine():
            CenterArc((CHANNELFILLET_R, CHANNELFILLET_R), CHANNELFILLET_R, 180, 90)
            Line((0, CHANNELFILLET_R), (-CHANNELFILLET_R * 0.02, CHANNELFILLET_R))
            Line((-CHANNELFILLET_R * 0.02, CHANNELFILLET_R), (-CHANNELFILLET_R * 0.02, -CHANNELFILLET_R * 0.02))
            Line((-CHANNELFILLET_R * 0.02, -CHANNELFILLET_R * 0.02), (CHANNELFILLET_R, -CHANNELFILLET_R * 0.02))
            Line((CHANNELFILLET_R, -CHANNELFILLET_R * 0.02), (CHANNELFILLET_R, 0))
        make_face()
    channelfillet_piece_7a = extrude(amount=9, mode=Mode.PRIVATE)
    channelfillet_piece_7a = split(channelfillet_piece_7a, bisect_by=Plane(origin=(17.247209771, 4, 4.097209771), z_dir=(0, 1, 0)), keep=Keep.TOP, mode=Mode.PRIVATE)
    with BuildSketch(Plane(origin=(12.7, 4, 4.55), x_dir=(0, 1, 0), z_dir=(1, 0, 0))) as channelfillet_piece_7b_section:
        with BuildLine():
            CenterArc((CHANNELFILLET_R, -CHANNELFILLET_R), CHANNELFILLET_R, 90, 90)
            Line((0, -CHANNELFILLET_R), (-CHANNELFILLET_R * 0.02, -CHANNELFILLET_R))
            Line((-CHANNELFILLET_R * 0.02, -CHANNELFILLET_R), (-CHANNELFILLET_R * 0.02, CHANNELFILLET_R * 0.02))
            Line((-CHANNELFILLET_R * 0.02, CHANNELFILLET_R * 0.02), (CHANNELFILLET_R, CHANNELFILLET_R * 0.02))
            Line((CHANNELFILLET_R, CHANNELFILLET_R * 0.02), (CHANNELFILLET_R, 0))
        make_face()
    channelfillet_piece_7b = extrude(amount=9.6, mode=Mode.PRIVATE)
    channelfillet_piece_7b = split(channelfillet_piece_7b, bisect_by=Plane(origin=(17.7, 4.452790229, 4.097209771), z_dir=(-1, 0, 0)), keep=Keep.TOP, mode=Mode.PRIVATE)
    channelfillet_piece_7 = channelfillet_piece_7a & channelfillet_piece_7b
    add(channelfillet_piece_7, mode=Mode.SUBTRACT)

    # Sketch12 → M5Head (cut, two sides: drawn at the far end of the back side and taken through both)
    with BuildSketch(Plane(origin=(0, 10, 0), x_dir=(1, 0, 0), z_dir=(0, 1, 0)).offset(-M5HEAD_DEPTH_BACK)):
        with Locations(Location((44, -7.5, 0), (0, 0, 90))):
            Circle(SKETCH12_R)
        with Locations(Location((-4, -7.5, 0), (0, 0, 90))):
            Circle(SKETCH12_R)
    extrude(amount=M5HEAD_DEPTH + M5HEAD_DEPTH_BACK, mode=Mode.SUBTRACT)

    # Sketch13 → M5Thread (cut, through all)
    with BuildSketch(Plane(origin=(0, 10, 0), x_dir=(1, 0, 0), z_dir=(0, 1, 0))):
        with Locations(Location((44, -7.5, 0), (0, 0, 270))):
            Circle(SKETCH13_R)
        with Locations(Location((-4, -7.5, 0), (0, 0, 90))):
            Circle(SKETCH13_R)
    extrude(amount=-M5THREAD_DEPTH, mode=Mode.SUBTRACT)

    # EndFillet
    endfillet_edges = [part.edges().sort_by_distance(p)[0] for p in [
        (-15, 5, 15),
        (-15, 5, 0),
        (55, 5, 15),
        (55, 5, 0),
    ]]
    fillet(endfillet_edges, radius=ENDFILLET_R)


solid = part.part
